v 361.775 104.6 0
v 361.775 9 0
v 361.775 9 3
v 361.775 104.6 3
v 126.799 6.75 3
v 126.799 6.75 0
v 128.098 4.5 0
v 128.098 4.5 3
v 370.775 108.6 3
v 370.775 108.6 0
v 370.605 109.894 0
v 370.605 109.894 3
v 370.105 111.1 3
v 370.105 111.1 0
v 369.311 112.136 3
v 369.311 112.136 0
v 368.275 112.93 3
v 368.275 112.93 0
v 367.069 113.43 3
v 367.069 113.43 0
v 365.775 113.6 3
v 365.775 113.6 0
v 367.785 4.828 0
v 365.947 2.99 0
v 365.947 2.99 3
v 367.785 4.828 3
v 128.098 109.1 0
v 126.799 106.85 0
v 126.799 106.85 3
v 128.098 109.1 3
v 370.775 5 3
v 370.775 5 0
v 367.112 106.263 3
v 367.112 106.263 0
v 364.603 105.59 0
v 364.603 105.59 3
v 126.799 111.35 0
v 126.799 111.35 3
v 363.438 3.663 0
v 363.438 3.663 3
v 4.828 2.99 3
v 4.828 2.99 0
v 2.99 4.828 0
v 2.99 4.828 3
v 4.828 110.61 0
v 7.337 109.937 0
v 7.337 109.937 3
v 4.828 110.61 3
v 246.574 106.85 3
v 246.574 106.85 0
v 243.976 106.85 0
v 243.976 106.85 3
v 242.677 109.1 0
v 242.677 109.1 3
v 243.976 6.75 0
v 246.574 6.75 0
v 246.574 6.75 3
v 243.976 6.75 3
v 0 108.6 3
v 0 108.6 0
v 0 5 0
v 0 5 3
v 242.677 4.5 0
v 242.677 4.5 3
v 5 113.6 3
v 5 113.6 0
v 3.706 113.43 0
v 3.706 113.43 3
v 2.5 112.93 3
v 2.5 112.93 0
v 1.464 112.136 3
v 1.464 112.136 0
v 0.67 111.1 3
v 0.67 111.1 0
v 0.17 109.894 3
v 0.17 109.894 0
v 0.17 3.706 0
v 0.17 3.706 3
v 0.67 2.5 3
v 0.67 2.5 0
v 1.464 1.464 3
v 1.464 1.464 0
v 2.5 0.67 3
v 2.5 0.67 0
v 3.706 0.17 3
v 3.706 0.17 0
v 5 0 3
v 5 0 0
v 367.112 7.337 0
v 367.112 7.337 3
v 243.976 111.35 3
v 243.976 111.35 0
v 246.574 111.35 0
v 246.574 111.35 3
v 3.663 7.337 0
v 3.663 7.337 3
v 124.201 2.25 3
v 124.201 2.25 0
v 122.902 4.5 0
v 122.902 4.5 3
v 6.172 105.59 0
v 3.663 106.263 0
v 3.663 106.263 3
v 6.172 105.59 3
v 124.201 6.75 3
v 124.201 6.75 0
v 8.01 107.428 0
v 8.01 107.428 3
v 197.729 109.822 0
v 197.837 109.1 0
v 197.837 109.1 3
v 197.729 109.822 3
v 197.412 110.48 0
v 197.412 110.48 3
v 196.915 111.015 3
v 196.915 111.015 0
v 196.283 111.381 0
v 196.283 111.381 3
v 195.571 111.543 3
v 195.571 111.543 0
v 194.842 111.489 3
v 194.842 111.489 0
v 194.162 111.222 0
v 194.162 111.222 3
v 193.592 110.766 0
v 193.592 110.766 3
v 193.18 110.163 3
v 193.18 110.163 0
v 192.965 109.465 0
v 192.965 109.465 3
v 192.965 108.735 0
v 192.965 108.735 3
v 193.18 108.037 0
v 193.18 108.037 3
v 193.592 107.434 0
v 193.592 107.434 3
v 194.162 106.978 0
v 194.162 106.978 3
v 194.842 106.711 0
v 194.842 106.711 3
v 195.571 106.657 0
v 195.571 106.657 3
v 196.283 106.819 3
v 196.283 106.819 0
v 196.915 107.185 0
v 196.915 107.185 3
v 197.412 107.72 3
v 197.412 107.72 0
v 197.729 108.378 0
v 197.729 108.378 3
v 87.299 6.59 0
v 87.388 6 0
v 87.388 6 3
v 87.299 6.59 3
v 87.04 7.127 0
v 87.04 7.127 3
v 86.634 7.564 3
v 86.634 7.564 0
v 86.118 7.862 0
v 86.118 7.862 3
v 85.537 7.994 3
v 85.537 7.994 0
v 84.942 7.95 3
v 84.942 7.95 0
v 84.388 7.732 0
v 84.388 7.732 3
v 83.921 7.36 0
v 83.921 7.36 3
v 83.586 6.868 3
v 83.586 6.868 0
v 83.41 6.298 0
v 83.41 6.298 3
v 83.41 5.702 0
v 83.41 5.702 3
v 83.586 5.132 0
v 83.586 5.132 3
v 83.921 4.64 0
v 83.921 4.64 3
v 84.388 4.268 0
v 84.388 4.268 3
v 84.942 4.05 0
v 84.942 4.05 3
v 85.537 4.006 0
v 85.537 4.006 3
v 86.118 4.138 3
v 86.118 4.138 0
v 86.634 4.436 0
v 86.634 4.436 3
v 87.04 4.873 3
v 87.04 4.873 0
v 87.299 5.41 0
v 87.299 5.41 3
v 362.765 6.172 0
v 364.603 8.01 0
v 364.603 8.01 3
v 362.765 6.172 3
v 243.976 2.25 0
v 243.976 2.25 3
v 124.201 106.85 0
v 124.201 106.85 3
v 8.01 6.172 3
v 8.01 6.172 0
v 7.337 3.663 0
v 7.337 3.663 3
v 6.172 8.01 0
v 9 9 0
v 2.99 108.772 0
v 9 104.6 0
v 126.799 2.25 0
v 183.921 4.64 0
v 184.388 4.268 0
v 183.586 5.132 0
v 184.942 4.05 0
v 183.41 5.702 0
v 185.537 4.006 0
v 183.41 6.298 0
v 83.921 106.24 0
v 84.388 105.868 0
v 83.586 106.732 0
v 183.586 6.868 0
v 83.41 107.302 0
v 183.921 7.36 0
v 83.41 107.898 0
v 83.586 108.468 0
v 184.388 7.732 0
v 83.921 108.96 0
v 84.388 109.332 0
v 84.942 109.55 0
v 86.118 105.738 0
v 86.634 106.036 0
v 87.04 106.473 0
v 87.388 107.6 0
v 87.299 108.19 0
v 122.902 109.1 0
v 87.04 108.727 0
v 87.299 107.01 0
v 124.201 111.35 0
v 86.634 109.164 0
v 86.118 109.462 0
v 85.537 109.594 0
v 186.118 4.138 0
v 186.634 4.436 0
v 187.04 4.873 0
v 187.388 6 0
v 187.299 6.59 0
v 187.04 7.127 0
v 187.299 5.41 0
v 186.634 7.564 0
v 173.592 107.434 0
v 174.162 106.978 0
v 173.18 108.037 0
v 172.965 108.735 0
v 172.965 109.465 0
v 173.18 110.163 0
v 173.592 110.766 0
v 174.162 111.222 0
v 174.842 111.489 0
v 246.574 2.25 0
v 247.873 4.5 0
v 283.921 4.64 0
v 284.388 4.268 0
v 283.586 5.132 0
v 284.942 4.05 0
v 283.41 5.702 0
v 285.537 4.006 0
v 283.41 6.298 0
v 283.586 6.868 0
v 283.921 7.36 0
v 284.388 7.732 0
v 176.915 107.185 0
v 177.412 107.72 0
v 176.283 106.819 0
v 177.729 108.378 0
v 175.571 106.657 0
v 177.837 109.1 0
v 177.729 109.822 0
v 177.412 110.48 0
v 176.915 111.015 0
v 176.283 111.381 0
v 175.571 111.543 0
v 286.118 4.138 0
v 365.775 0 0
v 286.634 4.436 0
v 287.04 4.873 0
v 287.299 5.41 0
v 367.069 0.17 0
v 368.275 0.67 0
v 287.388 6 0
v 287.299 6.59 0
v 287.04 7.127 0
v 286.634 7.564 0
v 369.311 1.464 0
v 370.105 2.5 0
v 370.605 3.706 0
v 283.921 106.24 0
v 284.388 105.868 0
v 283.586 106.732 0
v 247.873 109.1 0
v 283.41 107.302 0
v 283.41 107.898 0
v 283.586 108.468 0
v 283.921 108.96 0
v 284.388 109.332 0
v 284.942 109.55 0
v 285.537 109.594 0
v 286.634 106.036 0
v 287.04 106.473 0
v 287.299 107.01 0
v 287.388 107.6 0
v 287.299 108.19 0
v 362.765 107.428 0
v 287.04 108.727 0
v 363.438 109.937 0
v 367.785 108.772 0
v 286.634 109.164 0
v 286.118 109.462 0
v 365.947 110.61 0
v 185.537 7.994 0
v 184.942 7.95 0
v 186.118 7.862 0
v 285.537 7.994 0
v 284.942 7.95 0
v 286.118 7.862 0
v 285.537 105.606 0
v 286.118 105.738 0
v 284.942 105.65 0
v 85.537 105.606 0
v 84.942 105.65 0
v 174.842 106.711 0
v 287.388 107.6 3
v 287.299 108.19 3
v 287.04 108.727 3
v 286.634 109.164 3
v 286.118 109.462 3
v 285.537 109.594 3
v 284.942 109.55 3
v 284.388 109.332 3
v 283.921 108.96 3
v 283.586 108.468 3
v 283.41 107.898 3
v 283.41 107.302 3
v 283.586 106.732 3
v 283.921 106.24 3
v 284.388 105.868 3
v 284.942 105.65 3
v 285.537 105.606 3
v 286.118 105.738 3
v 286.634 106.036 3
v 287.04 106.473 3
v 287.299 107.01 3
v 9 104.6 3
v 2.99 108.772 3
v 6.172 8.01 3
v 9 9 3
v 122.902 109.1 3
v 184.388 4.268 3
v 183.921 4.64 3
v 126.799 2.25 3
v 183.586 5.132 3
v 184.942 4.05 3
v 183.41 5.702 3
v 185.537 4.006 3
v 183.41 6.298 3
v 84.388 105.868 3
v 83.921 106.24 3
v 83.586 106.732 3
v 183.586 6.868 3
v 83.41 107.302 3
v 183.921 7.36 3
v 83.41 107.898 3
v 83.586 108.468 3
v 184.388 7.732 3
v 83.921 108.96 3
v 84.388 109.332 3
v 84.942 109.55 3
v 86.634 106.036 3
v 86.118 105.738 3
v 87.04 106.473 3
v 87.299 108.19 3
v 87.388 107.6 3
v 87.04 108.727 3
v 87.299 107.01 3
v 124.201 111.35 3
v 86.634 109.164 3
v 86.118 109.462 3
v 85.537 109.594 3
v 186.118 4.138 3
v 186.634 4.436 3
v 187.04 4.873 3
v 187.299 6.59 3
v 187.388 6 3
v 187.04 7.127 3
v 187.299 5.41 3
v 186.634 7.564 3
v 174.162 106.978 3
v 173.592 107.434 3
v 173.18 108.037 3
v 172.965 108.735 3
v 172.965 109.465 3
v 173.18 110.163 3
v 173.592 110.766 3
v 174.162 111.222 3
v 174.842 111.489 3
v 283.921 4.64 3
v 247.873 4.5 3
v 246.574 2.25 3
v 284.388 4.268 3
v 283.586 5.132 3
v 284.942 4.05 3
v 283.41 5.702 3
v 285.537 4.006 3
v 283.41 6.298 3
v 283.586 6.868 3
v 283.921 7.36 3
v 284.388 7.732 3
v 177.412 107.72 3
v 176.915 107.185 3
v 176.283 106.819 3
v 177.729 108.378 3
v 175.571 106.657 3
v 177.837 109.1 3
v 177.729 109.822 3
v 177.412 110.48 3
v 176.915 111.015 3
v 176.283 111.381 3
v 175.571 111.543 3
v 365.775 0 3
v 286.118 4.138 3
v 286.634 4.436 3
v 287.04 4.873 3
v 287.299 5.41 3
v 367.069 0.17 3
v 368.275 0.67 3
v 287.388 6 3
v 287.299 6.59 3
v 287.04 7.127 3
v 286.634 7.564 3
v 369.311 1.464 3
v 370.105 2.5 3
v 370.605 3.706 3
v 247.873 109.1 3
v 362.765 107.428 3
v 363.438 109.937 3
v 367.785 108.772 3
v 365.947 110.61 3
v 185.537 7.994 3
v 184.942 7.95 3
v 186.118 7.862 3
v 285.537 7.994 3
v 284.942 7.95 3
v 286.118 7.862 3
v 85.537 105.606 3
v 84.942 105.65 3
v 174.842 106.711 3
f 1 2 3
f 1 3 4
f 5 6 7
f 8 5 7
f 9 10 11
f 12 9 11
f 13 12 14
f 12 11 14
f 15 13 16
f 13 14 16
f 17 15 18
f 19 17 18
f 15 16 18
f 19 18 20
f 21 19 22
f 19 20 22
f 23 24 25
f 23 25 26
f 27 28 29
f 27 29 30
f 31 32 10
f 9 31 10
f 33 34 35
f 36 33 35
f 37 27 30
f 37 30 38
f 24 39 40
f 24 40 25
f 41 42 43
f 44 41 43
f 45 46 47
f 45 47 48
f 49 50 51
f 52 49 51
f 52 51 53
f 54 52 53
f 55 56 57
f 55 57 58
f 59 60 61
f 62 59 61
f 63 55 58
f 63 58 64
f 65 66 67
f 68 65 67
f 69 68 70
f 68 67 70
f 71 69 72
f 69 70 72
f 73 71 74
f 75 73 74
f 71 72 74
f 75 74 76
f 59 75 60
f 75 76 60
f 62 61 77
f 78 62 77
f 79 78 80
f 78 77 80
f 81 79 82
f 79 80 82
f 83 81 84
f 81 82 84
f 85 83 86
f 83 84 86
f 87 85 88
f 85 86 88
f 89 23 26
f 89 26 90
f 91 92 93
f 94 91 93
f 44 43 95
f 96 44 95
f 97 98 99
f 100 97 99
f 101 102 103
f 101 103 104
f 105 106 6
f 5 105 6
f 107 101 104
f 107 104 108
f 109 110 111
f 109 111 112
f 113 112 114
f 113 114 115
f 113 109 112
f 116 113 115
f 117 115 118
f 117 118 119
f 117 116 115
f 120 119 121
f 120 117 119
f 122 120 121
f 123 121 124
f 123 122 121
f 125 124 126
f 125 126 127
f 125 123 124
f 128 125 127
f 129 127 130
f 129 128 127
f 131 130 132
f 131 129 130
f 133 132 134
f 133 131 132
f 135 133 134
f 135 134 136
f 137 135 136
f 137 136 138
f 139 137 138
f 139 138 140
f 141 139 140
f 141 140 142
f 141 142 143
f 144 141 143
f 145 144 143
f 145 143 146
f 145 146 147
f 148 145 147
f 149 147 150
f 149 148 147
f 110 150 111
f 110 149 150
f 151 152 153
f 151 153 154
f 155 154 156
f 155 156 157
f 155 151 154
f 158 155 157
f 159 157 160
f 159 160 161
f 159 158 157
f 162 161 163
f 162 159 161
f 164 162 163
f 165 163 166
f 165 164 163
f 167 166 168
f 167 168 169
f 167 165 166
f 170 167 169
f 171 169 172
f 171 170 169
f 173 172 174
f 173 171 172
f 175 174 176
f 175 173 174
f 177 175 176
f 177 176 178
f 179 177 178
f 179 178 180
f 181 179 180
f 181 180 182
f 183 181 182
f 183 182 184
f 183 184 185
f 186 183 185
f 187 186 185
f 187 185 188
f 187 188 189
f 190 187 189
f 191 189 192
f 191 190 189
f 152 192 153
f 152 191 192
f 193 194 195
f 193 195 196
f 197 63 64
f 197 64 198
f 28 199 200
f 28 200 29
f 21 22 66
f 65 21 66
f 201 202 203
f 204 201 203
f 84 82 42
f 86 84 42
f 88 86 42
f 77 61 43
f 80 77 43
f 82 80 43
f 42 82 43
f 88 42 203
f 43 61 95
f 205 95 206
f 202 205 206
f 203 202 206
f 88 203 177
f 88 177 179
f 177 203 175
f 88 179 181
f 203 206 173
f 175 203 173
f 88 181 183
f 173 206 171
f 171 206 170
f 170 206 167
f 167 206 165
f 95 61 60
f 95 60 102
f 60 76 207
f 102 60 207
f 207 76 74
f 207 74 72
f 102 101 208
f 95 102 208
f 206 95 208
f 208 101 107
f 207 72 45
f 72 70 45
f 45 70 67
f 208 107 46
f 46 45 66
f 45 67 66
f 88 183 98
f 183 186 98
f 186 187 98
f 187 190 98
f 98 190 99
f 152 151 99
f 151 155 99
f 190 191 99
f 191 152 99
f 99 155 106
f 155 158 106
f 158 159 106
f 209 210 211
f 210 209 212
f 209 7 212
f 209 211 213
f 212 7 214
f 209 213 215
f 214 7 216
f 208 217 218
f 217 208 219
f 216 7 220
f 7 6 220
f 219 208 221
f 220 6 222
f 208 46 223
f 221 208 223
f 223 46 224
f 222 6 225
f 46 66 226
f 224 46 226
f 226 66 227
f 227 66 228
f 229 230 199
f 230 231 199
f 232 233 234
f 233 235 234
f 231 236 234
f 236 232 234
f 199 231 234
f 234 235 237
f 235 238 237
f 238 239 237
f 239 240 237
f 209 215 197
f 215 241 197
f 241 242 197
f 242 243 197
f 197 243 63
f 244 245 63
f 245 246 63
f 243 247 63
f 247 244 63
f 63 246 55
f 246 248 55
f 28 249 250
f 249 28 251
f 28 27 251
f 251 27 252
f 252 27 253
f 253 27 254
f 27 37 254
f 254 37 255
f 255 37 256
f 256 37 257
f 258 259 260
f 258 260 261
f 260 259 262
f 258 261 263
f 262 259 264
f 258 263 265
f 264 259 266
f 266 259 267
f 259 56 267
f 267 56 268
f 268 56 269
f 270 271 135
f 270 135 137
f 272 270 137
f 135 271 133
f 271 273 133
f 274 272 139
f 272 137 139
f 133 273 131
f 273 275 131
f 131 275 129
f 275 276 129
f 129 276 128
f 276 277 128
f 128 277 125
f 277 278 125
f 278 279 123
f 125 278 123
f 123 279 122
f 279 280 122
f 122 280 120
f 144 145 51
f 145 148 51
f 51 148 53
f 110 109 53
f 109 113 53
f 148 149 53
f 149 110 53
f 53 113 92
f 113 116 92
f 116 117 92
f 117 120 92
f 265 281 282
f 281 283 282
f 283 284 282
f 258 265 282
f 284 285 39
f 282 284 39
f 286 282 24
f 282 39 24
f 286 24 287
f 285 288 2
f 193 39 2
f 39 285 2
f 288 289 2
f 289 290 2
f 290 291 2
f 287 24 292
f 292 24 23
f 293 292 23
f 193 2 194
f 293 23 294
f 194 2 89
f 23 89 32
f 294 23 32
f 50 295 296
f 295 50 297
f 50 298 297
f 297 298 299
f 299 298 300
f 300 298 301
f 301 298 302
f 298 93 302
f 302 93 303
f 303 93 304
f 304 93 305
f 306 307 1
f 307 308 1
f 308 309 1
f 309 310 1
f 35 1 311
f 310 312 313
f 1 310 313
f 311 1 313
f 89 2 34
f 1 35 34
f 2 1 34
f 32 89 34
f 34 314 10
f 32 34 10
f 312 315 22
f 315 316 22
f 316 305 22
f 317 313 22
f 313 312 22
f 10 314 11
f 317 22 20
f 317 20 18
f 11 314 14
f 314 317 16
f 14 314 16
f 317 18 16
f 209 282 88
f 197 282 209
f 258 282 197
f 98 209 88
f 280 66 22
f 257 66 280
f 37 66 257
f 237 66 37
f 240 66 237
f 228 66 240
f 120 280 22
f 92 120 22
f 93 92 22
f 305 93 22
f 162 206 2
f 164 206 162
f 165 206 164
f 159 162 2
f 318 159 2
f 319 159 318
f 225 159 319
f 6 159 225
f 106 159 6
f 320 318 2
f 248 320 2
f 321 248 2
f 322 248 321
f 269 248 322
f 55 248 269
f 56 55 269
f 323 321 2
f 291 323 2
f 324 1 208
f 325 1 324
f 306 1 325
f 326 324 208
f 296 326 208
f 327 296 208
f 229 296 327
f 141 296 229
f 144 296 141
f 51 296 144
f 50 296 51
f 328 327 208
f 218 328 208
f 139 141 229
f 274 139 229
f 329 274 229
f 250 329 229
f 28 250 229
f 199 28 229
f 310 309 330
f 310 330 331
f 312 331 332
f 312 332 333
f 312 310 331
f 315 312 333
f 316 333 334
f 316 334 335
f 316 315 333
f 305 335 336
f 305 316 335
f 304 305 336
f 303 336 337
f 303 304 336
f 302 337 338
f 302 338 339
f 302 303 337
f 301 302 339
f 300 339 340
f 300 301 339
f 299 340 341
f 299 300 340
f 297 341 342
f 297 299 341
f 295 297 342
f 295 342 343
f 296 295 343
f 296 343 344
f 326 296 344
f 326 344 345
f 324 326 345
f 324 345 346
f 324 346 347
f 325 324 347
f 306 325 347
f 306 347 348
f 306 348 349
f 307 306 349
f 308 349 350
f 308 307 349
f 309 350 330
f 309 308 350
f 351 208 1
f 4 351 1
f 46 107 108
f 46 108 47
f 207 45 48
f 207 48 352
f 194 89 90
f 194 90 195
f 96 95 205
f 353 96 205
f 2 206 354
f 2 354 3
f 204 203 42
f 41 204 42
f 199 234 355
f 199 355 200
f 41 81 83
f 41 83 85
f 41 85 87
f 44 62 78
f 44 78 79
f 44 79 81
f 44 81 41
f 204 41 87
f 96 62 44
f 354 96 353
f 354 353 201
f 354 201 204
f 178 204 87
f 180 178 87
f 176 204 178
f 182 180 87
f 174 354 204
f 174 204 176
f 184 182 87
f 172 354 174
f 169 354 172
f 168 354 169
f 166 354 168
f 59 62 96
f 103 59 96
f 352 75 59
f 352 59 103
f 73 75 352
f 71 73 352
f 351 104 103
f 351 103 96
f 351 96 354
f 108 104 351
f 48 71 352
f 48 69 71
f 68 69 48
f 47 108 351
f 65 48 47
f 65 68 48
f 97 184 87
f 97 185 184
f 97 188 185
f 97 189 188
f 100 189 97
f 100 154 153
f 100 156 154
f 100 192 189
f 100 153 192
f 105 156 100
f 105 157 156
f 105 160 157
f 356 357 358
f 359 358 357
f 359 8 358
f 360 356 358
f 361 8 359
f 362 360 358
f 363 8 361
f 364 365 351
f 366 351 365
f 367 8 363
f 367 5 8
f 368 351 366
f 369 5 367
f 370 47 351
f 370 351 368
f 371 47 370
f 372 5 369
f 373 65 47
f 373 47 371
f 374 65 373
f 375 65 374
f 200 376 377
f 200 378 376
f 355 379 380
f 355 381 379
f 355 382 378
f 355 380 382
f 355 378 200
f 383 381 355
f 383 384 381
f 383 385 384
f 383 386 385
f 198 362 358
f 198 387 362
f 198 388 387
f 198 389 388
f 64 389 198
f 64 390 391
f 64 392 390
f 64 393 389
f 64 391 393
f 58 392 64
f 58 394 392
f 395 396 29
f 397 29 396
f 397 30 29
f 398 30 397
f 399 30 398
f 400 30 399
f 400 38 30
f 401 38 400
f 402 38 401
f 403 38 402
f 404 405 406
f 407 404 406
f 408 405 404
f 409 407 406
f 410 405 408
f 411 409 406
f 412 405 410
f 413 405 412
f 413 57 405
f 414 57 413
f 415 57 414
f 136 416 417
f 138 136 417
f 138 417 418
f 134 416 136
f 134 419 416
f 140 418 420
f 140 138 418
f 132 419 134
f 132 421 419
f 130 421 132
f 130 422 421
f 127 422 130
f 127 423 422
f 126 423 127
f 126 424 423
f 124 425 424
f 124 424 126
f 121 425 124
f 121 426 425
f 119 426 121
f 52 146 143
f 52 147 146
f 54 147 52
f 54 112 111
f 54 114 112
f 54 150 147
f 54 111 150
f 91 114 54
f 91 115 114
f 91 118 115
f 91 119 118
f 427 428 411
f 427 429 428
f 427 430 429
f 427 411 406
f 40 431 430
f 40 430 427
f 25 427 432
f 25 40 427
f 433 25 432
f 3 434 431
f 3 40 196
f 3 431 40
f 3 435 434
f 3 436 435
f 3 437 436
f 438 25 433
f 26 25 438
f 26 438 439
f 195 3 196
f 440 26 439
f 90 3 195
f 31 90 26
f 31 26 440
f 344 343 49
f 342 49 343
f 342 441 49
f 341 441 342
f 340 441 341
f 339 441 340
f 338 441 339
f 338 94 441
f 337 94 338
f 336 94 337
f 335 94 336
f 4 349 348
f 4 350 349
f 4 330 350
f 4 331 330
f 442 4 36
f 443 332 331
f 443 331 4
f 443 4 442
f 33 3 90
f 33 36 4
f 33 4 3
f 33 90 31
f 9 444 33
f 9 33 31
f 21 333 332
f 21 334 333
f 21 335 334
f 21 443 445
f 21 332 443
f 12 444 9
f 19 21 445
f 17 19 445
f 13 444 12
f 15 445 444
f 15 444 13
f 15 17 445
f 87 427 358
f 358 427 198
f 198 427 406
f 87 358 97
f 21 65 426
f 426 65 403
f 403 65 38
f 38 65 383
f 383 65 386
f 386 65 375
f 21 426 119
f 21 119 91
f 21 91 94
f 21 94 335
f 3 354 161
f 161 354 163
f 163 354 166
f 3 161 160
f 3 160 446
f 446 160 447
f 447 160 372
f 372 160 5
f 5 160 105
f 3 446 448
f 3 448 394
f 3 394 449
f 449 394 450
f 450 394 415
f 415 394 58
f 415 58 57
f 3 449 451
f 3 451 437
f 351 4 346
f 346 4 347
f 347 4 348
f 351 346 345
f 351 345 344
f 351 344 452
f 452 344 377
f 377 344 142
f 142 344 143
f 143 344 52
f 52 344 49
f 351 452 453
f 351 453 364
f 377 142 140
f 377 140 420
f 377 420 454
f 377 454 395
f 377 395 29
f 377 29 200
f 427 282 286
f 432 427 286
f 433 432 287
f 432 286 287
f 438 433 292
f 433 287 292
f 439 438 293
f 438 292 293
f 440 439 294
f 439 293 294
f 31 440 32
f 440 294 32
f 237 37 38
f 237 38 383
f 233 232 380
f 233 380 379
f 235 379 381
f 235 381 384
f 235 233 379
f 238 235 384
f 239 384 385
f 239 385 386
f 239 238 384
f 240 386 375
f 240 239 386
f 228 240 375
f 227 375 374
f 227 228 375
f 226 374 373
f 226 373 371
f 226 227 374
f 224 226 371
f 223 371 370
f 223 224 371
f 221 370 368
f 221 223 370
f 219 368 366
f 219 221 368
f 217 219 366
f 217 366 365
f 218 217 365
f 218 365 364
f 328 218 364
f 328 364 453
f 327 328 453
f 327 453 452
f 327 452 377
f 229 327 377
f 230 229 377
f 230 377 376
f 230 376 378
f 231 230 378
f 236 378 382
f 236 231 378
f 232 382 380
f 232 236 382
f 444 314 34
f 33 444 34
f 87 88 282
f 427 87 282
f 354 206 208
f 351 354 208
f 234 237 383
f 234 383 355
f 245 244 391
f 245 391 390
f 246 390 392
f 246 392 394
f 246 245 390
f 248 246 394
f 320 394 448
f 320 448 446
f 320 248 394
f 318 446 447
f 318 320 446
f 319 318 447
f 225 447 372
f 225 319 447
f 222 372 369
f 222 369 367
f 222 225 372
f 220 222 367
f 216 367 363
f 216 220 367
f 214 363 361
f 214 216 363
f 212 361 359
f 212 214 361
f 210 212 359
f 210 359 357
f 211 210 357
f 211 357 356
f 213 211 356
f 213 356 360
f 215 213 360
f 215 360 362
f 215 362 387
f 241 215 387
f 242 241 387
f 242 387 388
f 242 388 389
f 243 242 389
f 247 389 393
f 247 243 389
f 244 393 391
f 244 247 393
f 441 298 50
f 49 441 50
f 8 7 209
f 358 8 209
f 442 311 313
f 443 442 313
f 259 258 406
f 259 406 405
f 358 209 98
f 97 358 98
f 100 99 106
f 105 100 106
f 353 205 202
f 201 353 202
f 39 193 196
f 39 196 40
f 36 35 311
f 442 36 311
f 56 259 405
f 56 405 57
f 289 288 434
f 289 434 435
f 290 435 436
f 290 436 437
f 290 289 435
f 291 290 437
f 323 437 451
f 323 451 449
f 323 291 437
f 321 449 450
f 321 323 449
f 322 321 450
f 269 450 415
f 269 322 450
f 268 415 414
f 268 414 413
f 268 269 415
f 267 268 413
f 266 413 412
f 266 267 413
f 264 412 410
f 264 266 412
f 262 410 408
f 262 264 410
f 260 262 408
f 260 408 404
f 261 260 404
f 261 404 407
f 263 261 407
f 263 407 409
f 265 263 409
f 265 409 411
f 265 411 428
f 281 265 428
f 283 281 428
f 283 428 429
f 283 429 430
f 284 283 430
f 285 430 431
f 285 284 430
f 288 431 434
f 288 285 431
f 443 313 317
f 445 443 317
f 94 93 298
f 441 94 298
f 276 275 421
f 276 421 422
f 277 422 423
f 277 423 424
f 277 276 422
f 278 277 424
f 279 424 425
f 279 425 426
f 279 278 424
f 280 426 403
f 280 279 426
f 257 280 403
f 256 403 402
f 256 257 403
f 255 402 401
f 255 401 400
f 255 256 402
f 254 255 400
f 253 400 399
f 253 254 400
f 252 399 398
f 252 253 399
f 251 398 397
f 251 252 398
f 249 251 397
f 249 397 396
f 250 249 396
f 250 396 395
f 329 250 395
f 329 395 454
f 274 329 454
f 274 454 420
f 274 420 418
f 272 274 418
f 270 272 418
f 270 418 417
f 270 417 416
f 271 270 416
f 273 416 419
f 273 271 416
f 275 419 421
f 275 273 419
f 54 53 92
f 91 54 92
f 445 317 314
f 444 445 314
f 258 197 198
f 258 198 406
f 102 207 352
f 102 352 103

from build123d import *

# Parameters (mm, degrees)
MODEL_R             = 2
MODEL_R_2           = 2.45
MODEL_W             = 352.775
MODEL_H             = 95.6
BOSS_EXTRUDE1_DEPTH = 3


with BuildPart() as part:
    # Model → Boss-Extrude1 (new body)
    with BuildSketch(Plane.XY):
        with BuildLine():
            Line((0, 108.6), (0, 5))
            ThreePointArc((0, 5), (1.464466094, 1.464466094), (5, 0))
            Line((5, 0), (365.775, 0))
            ThreePointArc((365.775, 0), (369.310533906, 1.464466094), (370.775, 5))
            Line((370.775, 5), (370.775, 108.6))
            ThreePointArc((370.775, 108.6), (369.310533906, 112.135533906), (365.775, 113.6))
            Line((365.775, 113.6), (5, 113.6))
            ThreePointArc((5, 113.6), (1.464466094, 112.135533906), (0, 108.6))
        make_face()
        with Locations((85.3875, 107.6)):
            Circle(MODEL_R, mode=Mode.SUBTRACT)
        with Locations((285.3875, 107.6)):
            Circle(MODEL_R, mode=Mode.SUBTRACT)
        with Locations((85.3875, 6)):
            Circle(MODEL_R, mode=Mode.SUBTRACT)
        with Locations((185.3875, 6)):
            Circle(MODEL_R, mode=Mode.SUBTRACT)
        with Locations((285.3875, 6)):
            Circle(MODEL_R, mode=Mode.SUBTRACT)
        with Locations((175.3875, 109.1)):
            Circle(MODEL_R_2, mode=Mode.SUBTRACT)
        with Locations((195.3875, 109.1)):
            Circle(MODEL_R_2, mode=Mode.SUBTRACT)
        with Locations((185.3875, 56.8)):
            Rectangle(MODEL_W, MODEL_H, mode=Mode.SUBTRACT)
        Polygon((365.947431604, 110.609548911), (367.784548911, 108.772431604), (367.112117307, 106.262882693), (364.602568396, 105.590451089), (362.765451089, 107.427568396), (363.437882693, 109.937117307), align=None, mode=Mode.SUBTRACT)
        Polygon((4.827568396, 110.609548911), (2.990451089, 108.772431604), (3.662882693, 106.262882693), (6.172431604, 105.590451089), (8.009548911, 107.427568396), (7.337117307, 109.937117307), align=None, mode=Mode.SUBTRACT)
        Polygon((365.947431604, 2.990451089), (367.784548911, 4.827568396), (367.112117307, 7.337117307), (364.602568396, 8.009548911), (362.765451089, 6.172431604), (363.437882693, 3.662882693), align=None, mode=Mode.SUBTRACT)
        Polygon((4.827568396, 2.990451089), (2.990451089, 4.827568396), (3.662882693, 7.337117307), (6.172431604, 8.009548911), (8.009548911, 6.172431604), (7.337117307, 3.662882693), align=None, mode=Mode.SUBTRACT)
        Polygon((126.799038106, 2.25), (124.200961894, 2.25), (122.901923789, 4.5), (124.200961894, 6.75), (126.799038106, 6.75), (128.098076211, 4.5), align=None, mode=Mode.SUBTRACT)
        Polygon((126.799038106, 111.35), (124.200961894, 111.35), (122.901923789, 109.1), (124.200961894, 106.85), (126.799038106, 106.85), (128.098076211, 109.1), align=None, mode=Mode.SUBTRACT)
        Polygon((243.975961894, 2.25), (246.574038106, 2.25), (247.873076211, 4.5), (246.574038106, 6.75), (243.975961894, 6.75), (242.676923789, 4.5), align=None, mode=Mode.SUBTRACT)
        Polygon((243.975961894, 111.35), (246.574038106, 111.35), (247.873076211, 109.1), (246.574038106, 106.85), (243.975961894, 106.85), (242.676923789, 109.1), align=None, mode=Mode.SUBTRACT)
    extrude(amount=BOSS_EXTRUDE1_DEPTH)


solid = part.part
